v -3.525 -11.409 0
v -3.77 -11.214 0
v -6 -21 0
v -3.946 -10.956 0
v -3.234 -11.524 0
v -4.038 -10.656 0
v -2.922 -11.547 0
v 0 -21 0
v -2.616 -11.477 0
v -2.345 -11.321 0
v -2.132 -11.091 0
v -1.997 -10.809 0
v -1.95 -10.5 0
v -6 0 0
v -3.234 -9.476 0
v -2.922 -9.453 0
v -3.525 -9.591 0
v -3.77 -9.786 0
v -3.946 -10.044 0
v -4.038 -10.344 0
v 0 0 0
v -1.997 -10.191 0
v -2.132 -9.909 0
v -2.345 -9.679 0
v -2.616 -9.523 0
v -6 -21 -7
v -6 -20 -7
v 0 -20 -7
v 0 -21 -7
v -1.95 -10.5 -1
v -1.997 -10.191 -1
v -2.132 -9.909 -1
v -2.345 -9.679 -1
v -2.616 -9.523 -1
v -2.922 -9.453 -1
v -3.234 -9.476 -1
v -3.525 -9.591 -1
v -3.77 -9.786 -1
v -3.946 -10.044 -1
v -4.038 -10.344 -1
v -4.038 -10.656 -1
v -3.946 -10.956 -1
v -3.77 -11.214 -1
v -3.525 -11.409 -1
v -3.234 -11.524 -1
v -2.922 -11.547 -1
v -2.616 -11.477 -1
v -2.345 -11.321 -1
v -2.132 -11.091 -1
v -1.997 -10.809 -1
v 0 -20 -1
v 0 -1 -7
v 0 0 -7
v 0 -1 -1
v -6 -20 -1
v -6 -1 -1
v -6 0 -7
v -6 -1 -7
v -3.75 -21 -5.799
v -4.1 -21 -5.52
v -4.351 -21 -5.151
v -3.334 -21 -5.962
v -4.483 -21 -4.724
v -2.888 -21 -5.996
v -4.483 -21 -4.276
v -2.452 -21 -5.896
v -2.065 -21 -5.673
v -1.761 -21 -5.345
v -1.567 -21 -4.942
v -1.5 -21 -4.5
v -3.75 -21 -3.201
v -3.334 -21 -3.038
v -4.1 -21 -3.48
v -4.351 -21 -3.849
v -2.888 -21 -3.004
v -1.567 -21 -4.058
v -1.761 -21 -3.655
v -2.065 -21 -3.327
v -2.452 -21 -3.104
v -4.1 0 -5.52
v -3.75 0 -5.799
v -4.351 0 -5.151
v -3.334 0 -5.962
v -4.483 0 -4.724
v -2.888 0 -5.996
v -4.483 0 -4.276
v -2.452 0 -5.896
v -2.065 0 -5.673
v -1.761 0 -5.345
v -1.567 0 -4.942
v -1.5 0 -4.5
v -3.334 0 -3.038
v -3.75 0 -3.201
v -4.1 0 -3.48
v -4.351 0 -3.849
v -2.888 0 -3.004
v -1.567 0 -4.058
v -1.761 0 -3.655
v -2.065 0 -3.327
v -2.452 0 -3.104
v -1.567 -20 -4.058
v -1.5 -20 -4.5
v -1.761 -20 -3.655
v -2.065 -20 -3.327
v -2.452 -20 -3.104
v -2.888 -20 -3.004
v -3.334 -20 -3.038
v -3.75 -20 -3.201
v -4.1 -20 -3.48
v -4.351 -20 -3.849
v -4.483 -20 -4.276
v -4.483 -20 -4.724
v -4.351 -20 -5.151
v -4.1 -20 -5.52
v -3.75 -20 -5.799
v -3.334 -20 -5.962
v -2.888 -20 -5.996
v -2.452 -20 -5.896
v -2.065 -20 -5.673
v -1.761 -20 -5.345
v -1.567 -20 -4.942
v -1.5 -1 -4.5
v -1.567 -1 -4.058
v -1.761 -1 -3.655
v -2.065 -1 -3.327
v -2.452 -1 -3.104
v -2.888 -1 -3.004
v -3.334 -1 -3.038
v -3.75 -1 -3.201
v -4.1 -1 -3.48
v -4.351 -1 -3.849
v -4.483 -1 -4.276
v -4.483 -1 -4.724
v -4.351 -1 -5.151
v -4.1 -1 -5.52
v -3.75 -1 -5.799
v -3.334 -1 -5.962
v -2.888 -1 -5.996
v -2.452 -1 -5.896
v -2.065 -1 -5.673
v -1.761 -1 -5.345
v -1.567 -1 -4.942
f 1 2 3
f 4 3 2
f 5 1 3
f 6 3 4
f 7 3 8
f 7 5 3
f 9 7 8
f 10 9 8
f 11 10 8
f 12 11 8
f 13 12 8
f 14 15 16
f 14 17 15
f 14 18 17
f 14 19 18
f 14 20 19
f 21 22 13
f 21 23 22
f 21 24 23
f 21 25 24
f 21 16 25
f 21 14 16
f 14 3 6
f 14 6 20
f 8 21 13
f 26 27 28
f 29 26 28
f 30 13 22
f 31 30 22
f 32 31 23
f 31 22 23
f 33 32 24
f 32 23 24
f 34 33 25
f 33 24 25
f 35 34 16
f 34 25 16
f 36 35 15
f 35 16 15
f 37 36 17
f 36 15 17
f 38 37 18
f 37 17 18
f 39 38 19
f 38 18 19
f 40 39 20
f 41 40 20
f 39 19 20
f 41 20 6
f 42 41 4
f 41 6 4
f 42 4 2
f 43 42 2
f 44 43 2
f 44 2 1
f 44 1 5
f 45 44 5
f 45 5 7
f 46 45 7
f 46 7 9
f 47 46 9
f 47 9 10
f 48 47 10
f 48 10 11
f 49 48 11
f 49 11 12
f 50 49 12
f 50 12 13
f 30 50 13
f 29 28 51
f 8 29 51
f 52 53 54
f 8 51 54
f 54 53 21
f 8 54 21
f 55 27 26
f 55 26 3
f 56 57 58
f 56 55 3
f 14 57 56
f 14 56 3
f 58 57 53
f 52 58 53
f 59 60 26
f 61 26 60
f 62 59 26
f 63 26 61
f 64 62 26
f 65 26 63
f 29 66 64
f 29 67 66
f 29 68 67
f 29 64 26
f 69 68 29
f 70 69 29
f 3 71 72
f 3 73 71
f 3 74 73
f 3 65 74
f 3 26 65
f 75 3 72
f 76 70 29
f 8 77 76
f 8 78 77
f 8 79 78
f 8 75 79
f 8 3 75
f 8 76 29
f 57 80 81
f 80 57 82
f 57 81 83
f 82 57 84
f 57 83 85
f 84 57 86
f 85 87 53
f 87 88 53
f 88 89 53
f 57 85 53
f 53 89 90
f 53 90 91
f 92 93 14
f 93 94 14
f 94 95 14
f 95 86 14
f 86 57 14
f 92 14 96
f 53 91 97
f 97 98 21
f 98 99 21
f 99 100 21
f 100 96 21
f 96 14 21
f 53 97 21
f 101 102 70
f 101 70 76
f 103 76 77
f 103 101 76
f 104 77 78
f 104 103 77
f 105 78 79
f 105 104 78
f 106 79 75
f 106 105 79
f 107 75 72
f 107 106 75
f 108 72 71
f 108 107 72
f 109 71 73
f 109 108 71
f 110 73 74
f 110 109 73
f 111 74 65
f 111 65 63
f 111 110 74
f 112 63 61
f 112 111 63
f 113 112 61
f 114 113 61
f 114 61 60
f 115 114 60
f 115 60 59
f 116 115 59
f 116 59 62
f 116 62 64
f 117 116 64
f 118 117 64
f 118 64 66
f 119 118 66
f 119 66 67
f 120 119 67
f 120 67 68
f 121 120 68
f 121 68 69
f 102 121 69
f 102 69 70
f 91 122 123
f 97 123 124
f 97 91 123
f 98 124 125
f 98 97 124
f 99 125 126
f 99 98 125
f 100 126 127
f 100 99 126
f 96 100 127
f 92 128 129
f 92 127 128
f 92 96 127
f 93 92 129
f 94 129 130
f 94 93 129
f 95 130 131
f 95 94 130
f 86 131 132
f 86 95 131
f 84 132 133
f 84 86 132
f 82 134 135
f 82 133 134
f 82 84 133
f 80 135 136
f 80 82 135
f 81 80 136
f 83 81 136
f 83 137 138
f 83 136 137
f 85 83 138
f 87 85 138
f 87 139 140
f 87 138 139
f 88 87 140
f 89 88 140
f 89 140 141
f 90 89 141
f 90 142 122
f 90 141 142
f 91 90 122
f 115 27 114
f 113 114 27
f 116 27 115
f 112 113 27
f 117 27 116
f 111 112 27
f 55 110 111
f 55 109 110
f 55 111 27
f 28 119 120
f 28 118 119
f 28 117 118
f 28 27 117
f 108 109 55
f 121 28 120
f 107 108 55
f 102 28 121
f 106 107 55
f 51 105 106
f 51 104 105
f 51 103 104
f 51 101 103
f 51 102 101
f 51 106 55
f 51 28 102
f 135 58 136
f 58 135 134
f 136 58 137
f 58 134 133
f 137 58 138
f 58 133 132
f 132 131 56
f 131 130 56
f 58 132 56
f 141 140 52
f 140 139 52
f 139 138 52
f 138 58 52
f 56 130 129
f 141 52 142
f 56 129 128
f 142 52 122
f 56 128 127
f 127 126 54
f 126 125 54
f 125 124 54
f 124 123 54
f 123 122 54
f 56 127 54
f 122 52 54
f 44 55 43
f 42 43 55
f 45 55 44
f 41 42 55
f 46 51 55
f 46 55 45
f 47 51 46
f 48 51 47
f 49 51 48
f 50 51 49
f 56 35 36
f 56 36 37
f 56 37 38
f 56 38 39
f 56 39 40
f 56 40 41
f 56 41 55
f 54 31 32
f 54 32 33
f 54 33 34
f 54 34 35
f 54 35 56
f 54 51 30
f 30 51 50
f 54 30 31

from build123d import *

# Parameters (mm, degrees)
F0_W     = 6
F0_H     = 7
F0_R     = 1.5
F1_DEPTH = 21
F2_W     = 19
F2_H     = 6
F3_DEPTH = 10.4
F4_R     = 1.05
F5_DEPTH = 25


with BuildPart() as f1:
    # F0 (on Front) → F1 (new body)
    with BuildSketch(Plane.XZ):
        with Locations((-3, -3.5)):
            Rectangle(F0_W, F0_H)
        with Locations((-3, -4.5)):
            Circle(F0_R, mode=Mode.SUBTRACT)
    extrude(amount=F1_DEPTH)

    # F2 (on face) → F3 (cut)
    with BuildSketch(Plane.YZ):
        with Locations((-10.5, -4)):
            Rectangle(F2_W, F2_H)
    extrude(amount=-F3_DEPTH, mode=Mode.SUBTRACT)

    # F4 (on face) → F5 (cut)
    with BuildSketch(Plane.XY):
        with Locations((-3, -10.5)):
            Circle(F4_R)
    extrude(amount=-F5_DEPTH, mode=Mode.SUBTRACT)


solid = f1.part
